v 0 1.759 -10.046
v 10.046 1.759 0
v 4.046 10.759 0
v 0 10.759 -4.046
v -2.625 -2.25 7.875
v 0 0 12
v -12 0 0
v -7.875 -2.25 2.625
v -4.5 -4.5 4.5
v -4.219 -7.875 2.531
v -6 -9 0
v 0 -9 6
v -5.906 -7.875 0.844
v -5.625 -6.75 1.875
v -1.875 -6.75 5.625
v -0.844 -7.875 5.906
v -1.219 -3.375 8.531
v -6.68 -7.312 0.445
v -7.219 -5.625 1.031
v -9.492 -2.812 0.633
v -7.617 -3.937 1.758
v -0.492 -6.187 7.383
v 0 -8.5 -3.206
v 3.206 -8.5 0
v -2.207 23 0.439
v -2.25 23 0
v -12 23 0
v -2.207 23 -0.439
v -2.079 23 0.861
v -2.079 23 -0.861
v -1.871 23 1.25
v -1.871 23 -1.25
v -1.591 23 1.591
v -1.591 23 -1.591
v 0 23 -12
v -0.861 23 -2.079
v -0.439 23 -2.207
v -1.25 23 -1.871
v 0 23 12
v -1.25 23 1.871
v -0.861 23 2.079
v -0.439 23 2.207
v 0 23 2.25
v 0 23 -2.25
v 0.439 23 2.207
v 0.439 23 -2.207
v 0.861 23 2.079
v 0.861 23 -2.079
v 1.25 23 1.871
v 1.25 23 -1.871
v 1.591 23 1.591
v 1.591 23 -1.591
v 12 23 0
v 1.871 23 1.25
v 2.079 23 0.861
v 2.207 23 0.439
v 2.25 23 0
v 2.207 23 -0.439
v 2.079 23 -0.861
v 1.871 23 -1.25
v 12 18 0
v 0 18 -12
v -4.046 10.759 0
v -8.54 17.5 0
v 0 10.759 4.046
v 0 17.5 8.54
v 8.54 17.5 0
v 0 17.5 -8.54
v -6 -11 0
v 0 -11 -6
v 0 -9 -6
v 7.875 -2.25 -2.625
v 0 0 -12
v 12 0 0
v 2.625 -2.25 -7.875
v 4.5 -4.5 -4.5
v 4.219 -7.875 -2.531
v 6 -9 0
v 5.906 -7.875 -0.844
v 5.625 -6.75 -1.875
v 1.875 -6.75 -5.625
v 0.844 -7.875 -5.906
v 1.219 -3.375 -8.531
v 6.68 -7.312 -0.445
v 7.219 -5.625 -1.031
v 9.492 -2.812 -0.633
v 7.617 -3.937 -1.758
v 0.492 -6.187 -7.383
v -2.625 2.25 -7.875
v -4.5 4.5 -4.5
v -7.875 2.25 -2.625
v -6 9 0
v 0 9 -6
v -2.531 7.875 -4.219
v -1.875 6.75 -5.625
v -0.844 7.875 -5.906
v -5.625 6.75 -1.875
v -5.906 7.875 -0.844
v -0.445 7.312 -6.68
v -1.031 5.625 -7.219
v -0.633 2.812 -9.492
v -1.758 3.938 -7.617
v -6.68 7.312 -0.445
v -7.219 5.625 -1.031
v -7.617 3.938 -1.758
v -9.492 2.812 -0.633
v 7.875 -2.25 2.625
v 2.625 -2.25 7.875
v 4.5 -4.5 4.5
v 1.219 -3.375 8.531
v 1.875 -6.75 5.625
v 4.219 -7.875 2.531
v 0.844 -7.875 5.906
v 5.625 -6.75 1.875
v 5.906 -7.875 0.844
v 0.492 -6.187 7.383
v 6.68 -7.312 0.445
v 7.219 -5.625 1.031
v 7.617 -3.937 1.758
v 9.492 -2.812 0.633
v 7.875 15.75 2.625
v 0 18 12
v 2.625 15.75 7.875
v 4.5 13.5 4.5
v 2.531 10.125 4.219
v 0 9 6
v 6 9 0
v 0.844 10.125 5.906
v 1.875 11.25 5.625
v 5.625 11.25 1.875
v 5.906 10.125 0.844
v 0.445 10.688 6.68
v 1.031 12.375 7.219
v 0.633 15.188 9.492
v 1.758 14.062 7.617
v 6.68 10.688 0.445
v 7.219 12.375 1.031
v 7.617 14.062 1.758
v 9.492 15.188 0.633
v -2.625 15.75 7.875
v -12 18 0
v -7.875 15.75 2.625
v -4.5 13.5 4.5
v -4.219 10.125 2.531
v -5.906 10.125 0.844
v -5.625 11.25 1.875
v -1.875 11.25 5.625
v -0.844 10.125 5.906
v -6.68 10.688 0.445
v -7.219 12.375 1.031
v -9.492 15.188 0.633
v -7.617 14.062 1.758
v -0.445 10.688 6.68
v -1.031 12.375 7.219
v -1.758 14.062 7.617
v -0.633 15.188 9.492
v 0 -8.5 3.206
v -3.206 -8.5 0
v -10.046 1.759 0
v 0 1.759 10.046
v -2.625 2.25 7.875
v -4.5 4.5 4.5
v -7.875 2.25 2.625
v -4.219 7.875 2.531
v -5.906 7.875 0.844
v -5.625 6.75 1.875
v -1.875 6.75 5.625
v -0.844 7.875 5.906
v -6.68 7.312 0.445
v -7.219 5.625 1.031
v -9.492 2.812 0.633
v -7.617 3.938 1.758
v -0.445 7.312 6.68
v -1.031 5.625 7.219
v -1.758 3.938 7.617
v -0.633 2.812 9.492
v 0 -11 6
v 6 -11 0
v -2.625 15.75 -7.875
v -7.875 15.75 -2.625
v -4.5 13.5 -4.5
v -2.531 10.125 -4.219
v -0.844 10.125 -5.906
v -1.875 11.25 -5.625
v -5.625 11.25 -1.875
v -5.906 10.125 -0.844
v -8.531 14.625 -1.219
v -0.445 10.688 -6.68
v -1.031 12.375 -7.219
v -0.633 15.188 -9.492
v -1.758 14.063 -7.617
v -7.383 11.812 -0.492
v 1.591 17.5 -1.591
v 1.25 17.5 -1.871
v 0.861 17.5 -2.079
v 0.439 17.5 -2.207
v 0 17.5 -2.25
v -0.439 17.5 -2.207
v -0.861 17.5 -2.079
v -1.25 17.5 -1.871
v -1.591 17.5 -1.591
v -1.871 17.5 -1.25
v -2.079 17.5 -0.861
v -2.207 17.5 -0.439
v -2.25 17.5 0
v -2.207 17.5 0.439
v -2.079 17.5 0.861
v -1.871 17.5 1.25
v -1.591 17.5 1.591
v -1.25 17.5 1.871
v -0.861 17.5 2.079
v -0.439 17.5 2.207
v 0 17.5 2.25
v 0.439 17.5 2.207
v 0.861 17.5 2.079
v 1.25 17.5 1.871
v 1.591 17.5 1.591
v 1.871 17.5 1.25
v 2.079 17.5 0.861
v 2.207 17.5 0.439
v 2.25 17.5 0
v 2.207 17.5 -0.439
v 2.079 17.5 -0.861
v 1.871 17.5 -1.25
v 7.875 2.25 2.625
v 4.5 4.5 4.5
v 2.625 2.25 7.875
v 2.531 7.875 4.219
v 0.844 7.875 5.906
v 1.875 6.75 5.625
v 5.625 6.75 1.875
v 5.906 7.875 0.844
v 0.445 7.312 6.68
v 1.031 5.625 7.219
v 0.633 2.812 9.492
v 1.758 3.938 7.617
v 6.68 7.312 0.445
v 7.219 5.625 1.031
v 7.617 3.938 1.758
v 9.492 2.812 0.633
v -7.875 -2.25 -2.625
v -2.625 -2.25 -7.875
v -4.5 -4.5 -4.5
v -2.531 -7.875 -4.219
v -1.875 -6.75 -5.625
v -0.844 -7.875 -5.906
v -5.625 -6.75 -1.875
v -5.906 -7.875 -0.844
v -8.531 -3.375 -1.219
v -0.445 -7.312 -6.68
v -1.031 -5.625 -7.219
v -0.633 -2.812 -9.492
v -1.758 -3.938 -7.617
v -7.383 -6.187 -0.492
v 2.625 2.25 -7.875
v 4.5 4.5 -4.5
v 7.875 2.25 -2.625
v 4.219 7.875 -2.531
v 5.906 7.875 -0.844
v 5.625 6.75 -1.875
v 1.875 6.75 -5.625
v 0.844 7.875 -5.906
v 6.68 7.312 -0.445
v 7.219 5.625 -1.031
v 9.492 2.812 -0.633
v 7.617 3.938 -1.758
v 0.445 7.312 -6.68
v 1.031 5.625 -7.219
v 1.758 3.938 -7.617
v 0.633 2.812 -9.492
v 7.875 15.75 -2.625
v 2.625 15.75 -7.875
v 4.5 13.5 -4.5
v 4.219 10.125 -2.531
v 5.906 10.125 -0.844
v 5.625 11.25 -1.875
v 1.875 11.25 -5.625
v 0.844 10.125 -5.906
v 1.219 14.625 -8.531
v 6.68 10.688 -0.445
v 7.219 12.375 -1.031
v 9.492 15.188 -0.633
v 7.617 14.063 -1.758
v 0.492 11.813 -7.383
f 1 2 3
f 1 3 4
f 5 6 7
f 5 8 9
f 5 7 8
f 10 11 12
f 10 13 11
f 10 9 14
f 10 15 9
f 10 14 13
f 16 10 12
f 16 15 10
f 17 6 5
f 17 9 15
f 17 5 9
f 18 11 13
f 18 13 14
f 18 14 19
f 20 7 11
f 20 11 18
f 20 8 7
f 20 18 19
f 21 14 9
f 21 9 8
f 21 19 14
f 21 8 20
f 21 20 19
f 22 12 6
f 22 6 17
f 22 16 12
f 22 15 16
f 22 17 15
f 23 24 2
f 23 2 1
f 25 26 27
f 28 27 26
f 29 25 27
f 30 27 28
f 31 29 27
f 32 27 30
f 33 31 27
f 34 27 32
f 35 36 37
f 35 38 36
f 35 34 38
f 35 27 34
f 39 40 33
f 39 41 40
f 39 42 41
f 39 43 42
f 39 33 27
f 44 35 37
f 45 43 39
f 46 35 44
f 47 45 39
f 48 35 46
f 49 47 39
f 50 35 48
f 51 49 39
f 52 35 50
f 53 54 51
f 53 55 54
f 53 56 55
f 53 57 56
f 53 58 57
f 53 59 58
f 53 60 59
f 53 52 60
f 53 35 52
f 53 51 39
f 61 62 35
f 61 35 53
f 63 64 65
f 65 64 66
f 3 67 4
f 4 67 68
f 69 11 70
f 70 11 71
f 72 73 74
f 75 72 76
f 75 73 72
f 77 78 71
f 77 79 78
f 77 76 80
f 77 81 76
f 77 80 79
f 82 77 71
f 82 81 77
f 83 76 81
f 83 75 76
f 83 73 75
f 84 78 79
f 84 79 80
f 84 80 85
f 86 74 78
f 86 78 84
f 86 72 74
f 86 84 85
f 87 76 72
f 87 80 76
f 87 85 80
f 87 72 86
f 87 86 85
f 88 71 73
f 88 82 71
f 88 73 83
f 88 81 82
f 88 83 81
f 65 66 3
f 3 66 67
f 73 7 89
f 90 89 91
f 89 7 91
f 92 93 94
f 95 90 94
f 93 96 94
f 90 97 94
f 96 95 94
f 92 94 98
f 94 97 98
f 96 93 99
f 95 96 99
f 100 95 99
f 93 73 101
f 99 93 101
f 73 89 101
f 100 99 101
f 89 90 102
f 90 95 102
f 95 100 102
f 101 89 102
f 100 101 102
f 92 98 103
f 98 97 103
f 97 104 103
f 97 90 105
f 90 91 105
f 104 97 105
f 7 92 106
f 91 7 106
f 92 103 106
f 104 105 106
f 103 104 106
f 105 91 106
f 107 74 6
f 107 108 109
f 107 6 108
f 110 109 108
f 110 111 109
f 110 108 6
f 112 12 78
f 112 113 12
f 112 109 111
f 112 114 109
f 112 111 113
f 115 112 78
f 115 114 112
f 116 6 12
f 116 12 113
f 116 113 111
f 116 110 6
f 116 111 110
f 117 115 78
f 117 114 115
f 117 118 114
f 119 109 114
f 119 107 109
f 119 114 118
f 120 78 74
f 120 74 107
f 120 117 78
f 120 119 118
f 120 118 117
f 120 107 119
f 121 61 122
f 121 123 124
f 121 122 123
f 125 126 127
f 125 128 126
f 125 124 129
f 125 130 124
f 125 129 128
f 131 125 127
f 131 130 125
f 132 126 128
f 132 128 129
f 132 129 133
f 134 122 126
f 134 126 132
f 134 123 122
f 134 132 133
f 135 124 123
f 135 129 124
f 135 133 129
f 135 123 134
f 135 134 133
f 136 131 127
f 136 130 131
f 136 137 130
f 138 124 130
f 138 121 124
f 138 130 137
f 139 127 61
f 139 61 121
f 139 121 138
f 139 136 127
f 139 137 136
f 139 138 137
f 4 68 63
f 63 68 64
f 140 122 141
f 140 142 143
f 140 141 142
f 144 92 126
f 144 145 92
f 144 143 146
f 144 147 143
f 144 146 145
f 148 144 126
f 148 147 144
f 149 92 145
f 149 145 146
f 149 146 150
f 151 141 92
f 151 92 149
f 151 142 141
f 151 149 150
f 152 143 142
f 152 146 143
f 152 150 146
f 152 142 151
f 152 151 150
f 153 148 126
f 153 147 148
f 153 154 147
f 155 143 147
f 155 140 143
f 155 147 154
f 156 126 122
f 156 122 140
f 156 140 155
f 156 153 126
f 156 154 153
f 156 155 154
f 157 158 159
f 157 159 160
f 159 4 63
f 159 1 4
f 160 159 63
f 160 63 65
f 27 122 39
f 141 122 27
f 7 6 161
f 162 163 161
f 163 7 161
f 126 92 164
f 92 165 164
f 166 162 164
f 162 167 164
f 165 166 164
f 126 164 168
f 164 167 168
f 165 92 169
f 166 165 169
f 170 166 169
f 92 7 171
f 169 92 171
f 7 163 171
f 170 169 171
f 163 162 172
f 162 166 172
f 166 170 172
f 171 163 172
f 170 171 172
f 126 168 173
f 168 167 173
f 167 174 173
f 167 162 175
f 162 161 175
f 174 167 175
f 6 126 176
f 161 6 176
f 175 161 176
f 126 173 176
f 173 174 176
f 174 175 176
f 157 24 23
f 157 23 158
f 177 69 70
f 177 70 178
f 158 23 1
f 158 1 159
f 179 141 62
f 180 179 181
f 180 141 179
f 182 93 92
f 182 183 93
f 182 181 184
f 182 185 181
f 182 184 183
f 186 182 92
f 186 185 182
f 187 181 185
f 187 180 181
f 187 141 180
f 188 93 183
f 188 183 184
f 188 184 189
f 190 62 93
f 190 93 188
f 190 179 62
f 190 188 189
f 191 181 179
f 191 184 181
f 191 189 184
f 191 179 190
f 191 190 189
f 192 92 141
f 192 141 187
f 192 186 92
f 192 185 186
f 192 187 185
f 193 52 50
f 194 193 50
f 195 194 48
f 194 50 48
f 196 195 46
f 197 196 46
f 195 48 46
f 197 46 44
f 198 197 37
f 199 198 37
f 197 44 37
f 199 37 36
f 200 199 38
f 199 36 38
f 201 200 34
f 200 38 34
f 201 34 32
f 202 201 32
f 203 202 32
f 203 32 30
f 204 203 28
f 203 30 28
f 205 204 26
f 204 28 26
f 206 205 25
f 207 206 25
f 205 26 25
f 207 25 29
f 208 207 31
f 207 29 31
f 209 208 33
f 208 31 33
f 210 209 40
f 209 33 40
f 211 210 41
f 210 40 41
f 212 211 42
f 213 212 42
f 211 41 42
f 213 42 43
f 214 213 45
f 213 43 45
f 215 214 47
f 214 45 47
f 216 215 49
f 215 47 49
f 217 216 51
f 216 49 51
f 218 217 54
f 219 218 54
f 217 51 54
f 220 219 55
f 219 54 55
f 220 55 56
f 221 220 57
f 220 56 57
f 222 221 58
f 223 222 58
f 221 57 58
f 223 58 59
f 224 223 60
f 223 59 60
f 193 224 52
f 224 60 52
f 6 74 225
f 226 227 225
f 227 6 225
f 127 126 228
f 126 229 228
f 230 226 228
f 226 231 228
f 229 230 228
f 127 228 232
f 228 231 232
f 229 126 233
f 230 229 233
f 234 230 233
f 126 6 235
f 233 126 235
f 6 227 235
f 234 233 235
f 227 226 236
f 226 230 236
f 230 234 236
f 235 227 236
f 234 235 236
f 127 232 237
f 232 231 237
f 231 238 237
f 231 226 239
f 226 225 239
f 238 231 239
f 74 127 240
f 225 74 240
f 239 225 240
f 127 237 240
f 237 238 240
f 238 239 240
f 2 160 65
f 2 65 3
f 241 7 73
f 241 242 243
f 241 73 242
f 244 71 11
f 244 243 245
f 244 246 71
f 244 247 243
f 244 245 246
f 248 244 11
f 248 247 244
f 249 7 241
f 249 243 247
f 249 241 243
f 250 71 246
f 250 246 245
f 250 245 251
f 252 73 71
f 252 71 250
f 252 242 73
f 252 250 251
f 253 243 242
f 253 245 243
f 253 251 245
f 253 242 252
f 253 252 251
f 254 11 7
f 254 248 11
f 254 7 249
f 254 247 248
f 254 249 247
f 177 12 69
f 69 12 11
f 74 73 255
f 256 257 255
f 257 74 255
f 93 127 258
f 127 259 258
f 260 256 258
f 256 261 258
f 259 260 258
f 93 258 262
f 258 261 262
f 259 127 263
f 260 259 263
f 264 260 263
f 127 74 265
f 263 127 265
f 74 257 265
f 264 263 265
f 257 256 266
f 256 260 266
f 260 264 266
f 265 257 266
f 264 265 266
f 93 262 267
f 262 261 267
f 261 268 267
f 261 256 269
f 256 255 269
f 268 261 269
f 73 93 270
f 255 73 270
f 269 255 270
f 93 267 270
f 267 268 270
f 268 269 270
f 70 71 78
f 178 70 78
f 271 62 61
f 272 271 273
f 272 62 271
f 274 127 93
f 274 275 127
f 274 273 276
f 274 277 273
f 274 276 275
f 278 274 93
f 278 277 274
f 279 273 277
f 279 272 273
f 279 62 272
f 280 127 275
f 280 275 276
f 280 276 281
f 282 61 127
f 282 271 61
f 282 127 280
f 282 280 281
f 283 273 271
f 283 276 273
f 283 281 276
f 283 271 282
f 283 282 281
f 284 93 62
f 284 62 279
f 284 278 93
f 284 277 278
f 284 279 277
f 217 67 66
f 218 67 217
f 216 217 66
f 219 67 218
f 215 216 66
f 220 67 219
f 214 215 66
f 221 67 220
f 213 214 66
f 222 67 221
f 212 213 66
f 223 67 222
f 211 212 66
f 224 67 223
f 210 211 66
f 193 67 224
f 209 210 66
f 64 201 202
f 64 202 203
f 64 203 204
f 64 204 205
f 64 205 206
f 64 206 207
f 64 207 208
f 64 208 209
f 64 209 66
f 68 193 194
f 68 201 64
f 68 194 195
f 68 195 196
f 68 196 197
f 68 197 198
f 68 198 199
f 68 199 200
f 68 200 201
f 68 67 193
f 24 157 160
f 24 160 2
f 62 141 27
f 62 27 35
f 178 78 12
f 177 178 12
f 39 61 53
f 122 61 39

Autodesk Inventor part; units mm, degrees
ref_plane "YZ Plane" through (0, 0, 0) normal (1, 0, 0) x (0, 1, 0)
ref_plane "XY Plane" through (0, 0, 0) normal (0, 0, 1) x (1, 0, 0)
sketch "스케치1" plane through (0, 0, 0) normal (0, 1, 0) x (-1, 0, 0)
  line L0 (12, 0) -> (0, -12)
  line L1 (0, -12) -> (-12, 0)
  line L2 (-12, 0) -> (0, 12)
  line L3 (0, 12) -> (12, 0)
  circle A0 centre (0, 0) radius 12 construction
  dimension "d0" = 24
ref_plane "작업 평면1" through (0, 9, 0) normal (0, 1, 0) x (-1, 0, 0)
sketch "스케치2" plane through (0, 9, 0) normal (0, 1, 0) x (-1, 0, 0)
  line L0 (6, 0) -> (0, -6)
  line L1 (0, -6) -> (-6, 0)
  line L2 (-6, 0) -> (0, 6)
  line L3 (0, 6) -> (6, 0)
  circle A0 centre (0, 0) radius 6 construction
  dimension "d2" = 12
loft "로프트1" add profiles "스케치2", "스케치1"
ref_plane "작업 평면2" through (0, 0, 0) normal (0, 1, 0) x (-1, 0, 0)
mirror "미러1" about plane through (0, 9, 0) normal (0, 1, 0) of "로프트1"
mirror "미러2" about plane through (0, 0, 0) normal (0, 1, 0) of "로프트1"
shell "쉘1" thickness 0.5 removed faces 0 ; own thickness 2 on faces at (-5.5, -1.5, -5.5) (5.5, -1.5, 5.5) (-5.5, -1.5, 5.5) (5.5, -1.5, -5.5) (-5.5, 16.5, -5.5) (5.5, 16.5, -5.5) (5.5, 16.5, 5.5) (-5.5, 16.5, 5.5)
sketch "스케치3" plane through (0, -9, -6) normal (0, -1, 0) x (0.7071068, 0, 0.7071068)
  line L0 (0, 8.4853) -> (0, 0) projected
  line L1 (0, 0) -> (8.4853, 0) projected
  line L2 (8.4853, 0) -> (8.4853, 8.4853) projected
  line L3 (8.4853, 8.4853) -> (0, 8.4853) projected
  point P0 (4.2426, 4.2426)
extrude "돌출1" add sketch "스케치3" along normal blind 2
sketch "스케치4" plane through (-12, 18, 0) normal (0, 1, 0) x (0.7071068, 0, 0.7071068)
  line L0 (0, 0) -> (0, 16.9706) projected
  line L1 (16.9706, 0) -> (0, 0) projected
  line L2 (16.9706, 16.9706) -> (16.9706, 0) projected
  line L3 (0, 16.9706) -> (16.9706, 16.9706) projected
  point P0 (8.4853, 8.4853)
extrude "돌출2" add sketch "스케치4" along normal blind 5
sketch "스케치5" plane through (-12, 23, 0) normal (0, 1, 0) x (0.7071068, 0, -0.7071068)
  circle A0 centre (8.4853, -8.4853) radius 2.25
  dimension "d14" = 4.5
extrude "돌출3" cut sketch "스케치5" against normal blind 5.5
properties part number "n_4"
